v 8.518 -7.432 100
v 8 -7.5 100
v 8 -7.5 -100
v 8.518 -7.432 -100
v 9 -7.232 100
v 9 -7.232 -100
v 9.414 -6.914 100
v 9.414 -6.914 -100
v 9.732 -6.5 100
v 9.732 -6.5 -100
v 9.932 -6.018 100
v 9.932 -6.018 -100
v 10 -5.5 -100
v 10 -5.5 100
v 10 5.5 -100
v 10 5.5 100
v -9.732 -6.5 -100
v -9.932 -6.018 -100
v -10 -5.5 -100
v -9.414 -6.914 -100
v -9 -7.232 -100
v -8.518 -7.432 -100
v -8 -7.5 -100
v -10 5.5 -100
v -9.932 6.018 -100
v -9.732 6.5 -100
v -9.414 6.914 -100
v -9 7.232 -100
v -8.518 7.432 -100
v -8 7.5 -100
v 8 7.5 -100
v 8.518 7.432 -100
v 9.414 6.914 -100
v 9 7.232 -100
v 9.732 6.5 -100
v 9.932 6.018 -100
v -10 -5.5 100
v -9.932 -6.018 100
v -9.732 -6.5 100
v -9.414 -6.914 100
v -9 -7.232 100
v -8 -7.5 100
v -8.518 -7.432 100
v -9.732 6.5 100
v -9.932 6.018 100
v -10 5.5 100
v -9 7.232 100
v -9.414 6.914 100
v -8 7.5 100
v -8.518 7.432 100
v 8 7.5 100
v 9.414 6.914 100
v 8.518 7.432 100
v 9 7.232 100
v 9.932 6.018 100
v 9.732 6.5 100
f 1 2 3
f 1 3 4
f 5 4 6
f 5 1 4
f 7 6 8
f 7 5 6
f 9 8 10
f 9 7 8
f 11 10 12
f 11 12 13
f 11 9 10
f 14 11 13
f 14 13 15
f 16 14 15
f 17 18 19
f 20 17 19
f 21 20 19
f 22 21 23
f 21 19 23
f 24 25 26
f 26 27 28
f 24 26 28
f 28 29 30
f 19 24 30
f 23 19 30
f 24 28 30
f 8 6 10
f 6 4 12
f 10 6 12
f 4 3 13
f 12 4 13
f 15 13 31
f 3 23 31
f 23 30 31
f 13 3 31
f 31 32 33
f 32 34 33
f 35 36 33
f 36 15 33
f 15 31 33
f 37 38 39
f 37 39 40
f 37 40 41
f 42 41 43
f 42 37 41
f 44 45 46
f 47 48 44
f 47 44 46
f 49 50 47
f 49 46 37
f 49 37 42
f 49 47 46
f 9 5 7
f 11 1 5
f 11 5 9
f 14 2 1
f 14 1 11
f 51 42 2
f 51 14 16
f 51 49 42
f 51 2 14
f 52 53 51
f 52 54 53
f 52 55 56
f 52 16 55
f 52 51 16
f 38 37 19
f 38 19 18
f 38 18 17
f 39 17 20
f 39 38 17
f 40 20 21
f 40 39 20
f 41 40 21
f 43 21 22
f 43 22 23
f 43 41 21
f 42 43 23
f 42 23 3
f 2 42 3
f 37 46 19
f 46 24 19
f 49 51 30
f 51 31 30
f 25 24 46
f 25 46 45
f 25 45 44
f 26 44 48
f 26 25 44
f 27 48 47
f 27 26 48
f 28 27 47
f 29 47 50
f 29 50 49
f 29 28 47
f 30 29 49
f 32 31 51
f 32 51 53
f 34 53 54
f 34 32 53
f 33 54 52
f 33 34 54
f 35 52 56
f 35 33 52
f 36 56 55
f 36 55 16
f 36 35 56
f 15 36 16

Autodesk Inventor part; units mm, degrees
ref_plane "YZ Plane" through (0, 0, 0) normal (1, 0, 0) x (0, 1, 0)
ref_plane "XZ Plane" through (0, 0, 0) normal (0, 1, 0) x (-1, 0, 0)
ref_plane "XY Plane" through (0, 0, 0) normal (0, 0, 1) x (1, 0, 0)
sketch "Sketch1" plane through (0, 0, 0) normal (0, 0, 1) x (1, 0, 0)
  line L0 (-10, -7.5) -> (10, -7.5)
  line L1 (10, -7.5) -> (10, 7.5)
  line L2 (10, 7.5) -> (-10, 7.5)
  line L3 (-10, 7.5) -> (-10, -7.5)
  line L4 (0, 0) -> (0, 7.5) construction
  line L5 (0, 0) -> (10, 0) construction
  line L6 (0, 0) -> (-10, 0) construction
  line L7 (0, 0) -> (0, -7.5) construction
  dimension "d0" = 20
  dimension "d1" = 15
extrude "Extrusion1" add sketch "Sketch1" along normal mid plane 200
fillet "Fillet1" radius 2 4 edges at (10, -7.5, 0) (10, 7.5, 0) (-10, 7.5, 0) (-10, -7.5, 0)
properties part number "Product"
